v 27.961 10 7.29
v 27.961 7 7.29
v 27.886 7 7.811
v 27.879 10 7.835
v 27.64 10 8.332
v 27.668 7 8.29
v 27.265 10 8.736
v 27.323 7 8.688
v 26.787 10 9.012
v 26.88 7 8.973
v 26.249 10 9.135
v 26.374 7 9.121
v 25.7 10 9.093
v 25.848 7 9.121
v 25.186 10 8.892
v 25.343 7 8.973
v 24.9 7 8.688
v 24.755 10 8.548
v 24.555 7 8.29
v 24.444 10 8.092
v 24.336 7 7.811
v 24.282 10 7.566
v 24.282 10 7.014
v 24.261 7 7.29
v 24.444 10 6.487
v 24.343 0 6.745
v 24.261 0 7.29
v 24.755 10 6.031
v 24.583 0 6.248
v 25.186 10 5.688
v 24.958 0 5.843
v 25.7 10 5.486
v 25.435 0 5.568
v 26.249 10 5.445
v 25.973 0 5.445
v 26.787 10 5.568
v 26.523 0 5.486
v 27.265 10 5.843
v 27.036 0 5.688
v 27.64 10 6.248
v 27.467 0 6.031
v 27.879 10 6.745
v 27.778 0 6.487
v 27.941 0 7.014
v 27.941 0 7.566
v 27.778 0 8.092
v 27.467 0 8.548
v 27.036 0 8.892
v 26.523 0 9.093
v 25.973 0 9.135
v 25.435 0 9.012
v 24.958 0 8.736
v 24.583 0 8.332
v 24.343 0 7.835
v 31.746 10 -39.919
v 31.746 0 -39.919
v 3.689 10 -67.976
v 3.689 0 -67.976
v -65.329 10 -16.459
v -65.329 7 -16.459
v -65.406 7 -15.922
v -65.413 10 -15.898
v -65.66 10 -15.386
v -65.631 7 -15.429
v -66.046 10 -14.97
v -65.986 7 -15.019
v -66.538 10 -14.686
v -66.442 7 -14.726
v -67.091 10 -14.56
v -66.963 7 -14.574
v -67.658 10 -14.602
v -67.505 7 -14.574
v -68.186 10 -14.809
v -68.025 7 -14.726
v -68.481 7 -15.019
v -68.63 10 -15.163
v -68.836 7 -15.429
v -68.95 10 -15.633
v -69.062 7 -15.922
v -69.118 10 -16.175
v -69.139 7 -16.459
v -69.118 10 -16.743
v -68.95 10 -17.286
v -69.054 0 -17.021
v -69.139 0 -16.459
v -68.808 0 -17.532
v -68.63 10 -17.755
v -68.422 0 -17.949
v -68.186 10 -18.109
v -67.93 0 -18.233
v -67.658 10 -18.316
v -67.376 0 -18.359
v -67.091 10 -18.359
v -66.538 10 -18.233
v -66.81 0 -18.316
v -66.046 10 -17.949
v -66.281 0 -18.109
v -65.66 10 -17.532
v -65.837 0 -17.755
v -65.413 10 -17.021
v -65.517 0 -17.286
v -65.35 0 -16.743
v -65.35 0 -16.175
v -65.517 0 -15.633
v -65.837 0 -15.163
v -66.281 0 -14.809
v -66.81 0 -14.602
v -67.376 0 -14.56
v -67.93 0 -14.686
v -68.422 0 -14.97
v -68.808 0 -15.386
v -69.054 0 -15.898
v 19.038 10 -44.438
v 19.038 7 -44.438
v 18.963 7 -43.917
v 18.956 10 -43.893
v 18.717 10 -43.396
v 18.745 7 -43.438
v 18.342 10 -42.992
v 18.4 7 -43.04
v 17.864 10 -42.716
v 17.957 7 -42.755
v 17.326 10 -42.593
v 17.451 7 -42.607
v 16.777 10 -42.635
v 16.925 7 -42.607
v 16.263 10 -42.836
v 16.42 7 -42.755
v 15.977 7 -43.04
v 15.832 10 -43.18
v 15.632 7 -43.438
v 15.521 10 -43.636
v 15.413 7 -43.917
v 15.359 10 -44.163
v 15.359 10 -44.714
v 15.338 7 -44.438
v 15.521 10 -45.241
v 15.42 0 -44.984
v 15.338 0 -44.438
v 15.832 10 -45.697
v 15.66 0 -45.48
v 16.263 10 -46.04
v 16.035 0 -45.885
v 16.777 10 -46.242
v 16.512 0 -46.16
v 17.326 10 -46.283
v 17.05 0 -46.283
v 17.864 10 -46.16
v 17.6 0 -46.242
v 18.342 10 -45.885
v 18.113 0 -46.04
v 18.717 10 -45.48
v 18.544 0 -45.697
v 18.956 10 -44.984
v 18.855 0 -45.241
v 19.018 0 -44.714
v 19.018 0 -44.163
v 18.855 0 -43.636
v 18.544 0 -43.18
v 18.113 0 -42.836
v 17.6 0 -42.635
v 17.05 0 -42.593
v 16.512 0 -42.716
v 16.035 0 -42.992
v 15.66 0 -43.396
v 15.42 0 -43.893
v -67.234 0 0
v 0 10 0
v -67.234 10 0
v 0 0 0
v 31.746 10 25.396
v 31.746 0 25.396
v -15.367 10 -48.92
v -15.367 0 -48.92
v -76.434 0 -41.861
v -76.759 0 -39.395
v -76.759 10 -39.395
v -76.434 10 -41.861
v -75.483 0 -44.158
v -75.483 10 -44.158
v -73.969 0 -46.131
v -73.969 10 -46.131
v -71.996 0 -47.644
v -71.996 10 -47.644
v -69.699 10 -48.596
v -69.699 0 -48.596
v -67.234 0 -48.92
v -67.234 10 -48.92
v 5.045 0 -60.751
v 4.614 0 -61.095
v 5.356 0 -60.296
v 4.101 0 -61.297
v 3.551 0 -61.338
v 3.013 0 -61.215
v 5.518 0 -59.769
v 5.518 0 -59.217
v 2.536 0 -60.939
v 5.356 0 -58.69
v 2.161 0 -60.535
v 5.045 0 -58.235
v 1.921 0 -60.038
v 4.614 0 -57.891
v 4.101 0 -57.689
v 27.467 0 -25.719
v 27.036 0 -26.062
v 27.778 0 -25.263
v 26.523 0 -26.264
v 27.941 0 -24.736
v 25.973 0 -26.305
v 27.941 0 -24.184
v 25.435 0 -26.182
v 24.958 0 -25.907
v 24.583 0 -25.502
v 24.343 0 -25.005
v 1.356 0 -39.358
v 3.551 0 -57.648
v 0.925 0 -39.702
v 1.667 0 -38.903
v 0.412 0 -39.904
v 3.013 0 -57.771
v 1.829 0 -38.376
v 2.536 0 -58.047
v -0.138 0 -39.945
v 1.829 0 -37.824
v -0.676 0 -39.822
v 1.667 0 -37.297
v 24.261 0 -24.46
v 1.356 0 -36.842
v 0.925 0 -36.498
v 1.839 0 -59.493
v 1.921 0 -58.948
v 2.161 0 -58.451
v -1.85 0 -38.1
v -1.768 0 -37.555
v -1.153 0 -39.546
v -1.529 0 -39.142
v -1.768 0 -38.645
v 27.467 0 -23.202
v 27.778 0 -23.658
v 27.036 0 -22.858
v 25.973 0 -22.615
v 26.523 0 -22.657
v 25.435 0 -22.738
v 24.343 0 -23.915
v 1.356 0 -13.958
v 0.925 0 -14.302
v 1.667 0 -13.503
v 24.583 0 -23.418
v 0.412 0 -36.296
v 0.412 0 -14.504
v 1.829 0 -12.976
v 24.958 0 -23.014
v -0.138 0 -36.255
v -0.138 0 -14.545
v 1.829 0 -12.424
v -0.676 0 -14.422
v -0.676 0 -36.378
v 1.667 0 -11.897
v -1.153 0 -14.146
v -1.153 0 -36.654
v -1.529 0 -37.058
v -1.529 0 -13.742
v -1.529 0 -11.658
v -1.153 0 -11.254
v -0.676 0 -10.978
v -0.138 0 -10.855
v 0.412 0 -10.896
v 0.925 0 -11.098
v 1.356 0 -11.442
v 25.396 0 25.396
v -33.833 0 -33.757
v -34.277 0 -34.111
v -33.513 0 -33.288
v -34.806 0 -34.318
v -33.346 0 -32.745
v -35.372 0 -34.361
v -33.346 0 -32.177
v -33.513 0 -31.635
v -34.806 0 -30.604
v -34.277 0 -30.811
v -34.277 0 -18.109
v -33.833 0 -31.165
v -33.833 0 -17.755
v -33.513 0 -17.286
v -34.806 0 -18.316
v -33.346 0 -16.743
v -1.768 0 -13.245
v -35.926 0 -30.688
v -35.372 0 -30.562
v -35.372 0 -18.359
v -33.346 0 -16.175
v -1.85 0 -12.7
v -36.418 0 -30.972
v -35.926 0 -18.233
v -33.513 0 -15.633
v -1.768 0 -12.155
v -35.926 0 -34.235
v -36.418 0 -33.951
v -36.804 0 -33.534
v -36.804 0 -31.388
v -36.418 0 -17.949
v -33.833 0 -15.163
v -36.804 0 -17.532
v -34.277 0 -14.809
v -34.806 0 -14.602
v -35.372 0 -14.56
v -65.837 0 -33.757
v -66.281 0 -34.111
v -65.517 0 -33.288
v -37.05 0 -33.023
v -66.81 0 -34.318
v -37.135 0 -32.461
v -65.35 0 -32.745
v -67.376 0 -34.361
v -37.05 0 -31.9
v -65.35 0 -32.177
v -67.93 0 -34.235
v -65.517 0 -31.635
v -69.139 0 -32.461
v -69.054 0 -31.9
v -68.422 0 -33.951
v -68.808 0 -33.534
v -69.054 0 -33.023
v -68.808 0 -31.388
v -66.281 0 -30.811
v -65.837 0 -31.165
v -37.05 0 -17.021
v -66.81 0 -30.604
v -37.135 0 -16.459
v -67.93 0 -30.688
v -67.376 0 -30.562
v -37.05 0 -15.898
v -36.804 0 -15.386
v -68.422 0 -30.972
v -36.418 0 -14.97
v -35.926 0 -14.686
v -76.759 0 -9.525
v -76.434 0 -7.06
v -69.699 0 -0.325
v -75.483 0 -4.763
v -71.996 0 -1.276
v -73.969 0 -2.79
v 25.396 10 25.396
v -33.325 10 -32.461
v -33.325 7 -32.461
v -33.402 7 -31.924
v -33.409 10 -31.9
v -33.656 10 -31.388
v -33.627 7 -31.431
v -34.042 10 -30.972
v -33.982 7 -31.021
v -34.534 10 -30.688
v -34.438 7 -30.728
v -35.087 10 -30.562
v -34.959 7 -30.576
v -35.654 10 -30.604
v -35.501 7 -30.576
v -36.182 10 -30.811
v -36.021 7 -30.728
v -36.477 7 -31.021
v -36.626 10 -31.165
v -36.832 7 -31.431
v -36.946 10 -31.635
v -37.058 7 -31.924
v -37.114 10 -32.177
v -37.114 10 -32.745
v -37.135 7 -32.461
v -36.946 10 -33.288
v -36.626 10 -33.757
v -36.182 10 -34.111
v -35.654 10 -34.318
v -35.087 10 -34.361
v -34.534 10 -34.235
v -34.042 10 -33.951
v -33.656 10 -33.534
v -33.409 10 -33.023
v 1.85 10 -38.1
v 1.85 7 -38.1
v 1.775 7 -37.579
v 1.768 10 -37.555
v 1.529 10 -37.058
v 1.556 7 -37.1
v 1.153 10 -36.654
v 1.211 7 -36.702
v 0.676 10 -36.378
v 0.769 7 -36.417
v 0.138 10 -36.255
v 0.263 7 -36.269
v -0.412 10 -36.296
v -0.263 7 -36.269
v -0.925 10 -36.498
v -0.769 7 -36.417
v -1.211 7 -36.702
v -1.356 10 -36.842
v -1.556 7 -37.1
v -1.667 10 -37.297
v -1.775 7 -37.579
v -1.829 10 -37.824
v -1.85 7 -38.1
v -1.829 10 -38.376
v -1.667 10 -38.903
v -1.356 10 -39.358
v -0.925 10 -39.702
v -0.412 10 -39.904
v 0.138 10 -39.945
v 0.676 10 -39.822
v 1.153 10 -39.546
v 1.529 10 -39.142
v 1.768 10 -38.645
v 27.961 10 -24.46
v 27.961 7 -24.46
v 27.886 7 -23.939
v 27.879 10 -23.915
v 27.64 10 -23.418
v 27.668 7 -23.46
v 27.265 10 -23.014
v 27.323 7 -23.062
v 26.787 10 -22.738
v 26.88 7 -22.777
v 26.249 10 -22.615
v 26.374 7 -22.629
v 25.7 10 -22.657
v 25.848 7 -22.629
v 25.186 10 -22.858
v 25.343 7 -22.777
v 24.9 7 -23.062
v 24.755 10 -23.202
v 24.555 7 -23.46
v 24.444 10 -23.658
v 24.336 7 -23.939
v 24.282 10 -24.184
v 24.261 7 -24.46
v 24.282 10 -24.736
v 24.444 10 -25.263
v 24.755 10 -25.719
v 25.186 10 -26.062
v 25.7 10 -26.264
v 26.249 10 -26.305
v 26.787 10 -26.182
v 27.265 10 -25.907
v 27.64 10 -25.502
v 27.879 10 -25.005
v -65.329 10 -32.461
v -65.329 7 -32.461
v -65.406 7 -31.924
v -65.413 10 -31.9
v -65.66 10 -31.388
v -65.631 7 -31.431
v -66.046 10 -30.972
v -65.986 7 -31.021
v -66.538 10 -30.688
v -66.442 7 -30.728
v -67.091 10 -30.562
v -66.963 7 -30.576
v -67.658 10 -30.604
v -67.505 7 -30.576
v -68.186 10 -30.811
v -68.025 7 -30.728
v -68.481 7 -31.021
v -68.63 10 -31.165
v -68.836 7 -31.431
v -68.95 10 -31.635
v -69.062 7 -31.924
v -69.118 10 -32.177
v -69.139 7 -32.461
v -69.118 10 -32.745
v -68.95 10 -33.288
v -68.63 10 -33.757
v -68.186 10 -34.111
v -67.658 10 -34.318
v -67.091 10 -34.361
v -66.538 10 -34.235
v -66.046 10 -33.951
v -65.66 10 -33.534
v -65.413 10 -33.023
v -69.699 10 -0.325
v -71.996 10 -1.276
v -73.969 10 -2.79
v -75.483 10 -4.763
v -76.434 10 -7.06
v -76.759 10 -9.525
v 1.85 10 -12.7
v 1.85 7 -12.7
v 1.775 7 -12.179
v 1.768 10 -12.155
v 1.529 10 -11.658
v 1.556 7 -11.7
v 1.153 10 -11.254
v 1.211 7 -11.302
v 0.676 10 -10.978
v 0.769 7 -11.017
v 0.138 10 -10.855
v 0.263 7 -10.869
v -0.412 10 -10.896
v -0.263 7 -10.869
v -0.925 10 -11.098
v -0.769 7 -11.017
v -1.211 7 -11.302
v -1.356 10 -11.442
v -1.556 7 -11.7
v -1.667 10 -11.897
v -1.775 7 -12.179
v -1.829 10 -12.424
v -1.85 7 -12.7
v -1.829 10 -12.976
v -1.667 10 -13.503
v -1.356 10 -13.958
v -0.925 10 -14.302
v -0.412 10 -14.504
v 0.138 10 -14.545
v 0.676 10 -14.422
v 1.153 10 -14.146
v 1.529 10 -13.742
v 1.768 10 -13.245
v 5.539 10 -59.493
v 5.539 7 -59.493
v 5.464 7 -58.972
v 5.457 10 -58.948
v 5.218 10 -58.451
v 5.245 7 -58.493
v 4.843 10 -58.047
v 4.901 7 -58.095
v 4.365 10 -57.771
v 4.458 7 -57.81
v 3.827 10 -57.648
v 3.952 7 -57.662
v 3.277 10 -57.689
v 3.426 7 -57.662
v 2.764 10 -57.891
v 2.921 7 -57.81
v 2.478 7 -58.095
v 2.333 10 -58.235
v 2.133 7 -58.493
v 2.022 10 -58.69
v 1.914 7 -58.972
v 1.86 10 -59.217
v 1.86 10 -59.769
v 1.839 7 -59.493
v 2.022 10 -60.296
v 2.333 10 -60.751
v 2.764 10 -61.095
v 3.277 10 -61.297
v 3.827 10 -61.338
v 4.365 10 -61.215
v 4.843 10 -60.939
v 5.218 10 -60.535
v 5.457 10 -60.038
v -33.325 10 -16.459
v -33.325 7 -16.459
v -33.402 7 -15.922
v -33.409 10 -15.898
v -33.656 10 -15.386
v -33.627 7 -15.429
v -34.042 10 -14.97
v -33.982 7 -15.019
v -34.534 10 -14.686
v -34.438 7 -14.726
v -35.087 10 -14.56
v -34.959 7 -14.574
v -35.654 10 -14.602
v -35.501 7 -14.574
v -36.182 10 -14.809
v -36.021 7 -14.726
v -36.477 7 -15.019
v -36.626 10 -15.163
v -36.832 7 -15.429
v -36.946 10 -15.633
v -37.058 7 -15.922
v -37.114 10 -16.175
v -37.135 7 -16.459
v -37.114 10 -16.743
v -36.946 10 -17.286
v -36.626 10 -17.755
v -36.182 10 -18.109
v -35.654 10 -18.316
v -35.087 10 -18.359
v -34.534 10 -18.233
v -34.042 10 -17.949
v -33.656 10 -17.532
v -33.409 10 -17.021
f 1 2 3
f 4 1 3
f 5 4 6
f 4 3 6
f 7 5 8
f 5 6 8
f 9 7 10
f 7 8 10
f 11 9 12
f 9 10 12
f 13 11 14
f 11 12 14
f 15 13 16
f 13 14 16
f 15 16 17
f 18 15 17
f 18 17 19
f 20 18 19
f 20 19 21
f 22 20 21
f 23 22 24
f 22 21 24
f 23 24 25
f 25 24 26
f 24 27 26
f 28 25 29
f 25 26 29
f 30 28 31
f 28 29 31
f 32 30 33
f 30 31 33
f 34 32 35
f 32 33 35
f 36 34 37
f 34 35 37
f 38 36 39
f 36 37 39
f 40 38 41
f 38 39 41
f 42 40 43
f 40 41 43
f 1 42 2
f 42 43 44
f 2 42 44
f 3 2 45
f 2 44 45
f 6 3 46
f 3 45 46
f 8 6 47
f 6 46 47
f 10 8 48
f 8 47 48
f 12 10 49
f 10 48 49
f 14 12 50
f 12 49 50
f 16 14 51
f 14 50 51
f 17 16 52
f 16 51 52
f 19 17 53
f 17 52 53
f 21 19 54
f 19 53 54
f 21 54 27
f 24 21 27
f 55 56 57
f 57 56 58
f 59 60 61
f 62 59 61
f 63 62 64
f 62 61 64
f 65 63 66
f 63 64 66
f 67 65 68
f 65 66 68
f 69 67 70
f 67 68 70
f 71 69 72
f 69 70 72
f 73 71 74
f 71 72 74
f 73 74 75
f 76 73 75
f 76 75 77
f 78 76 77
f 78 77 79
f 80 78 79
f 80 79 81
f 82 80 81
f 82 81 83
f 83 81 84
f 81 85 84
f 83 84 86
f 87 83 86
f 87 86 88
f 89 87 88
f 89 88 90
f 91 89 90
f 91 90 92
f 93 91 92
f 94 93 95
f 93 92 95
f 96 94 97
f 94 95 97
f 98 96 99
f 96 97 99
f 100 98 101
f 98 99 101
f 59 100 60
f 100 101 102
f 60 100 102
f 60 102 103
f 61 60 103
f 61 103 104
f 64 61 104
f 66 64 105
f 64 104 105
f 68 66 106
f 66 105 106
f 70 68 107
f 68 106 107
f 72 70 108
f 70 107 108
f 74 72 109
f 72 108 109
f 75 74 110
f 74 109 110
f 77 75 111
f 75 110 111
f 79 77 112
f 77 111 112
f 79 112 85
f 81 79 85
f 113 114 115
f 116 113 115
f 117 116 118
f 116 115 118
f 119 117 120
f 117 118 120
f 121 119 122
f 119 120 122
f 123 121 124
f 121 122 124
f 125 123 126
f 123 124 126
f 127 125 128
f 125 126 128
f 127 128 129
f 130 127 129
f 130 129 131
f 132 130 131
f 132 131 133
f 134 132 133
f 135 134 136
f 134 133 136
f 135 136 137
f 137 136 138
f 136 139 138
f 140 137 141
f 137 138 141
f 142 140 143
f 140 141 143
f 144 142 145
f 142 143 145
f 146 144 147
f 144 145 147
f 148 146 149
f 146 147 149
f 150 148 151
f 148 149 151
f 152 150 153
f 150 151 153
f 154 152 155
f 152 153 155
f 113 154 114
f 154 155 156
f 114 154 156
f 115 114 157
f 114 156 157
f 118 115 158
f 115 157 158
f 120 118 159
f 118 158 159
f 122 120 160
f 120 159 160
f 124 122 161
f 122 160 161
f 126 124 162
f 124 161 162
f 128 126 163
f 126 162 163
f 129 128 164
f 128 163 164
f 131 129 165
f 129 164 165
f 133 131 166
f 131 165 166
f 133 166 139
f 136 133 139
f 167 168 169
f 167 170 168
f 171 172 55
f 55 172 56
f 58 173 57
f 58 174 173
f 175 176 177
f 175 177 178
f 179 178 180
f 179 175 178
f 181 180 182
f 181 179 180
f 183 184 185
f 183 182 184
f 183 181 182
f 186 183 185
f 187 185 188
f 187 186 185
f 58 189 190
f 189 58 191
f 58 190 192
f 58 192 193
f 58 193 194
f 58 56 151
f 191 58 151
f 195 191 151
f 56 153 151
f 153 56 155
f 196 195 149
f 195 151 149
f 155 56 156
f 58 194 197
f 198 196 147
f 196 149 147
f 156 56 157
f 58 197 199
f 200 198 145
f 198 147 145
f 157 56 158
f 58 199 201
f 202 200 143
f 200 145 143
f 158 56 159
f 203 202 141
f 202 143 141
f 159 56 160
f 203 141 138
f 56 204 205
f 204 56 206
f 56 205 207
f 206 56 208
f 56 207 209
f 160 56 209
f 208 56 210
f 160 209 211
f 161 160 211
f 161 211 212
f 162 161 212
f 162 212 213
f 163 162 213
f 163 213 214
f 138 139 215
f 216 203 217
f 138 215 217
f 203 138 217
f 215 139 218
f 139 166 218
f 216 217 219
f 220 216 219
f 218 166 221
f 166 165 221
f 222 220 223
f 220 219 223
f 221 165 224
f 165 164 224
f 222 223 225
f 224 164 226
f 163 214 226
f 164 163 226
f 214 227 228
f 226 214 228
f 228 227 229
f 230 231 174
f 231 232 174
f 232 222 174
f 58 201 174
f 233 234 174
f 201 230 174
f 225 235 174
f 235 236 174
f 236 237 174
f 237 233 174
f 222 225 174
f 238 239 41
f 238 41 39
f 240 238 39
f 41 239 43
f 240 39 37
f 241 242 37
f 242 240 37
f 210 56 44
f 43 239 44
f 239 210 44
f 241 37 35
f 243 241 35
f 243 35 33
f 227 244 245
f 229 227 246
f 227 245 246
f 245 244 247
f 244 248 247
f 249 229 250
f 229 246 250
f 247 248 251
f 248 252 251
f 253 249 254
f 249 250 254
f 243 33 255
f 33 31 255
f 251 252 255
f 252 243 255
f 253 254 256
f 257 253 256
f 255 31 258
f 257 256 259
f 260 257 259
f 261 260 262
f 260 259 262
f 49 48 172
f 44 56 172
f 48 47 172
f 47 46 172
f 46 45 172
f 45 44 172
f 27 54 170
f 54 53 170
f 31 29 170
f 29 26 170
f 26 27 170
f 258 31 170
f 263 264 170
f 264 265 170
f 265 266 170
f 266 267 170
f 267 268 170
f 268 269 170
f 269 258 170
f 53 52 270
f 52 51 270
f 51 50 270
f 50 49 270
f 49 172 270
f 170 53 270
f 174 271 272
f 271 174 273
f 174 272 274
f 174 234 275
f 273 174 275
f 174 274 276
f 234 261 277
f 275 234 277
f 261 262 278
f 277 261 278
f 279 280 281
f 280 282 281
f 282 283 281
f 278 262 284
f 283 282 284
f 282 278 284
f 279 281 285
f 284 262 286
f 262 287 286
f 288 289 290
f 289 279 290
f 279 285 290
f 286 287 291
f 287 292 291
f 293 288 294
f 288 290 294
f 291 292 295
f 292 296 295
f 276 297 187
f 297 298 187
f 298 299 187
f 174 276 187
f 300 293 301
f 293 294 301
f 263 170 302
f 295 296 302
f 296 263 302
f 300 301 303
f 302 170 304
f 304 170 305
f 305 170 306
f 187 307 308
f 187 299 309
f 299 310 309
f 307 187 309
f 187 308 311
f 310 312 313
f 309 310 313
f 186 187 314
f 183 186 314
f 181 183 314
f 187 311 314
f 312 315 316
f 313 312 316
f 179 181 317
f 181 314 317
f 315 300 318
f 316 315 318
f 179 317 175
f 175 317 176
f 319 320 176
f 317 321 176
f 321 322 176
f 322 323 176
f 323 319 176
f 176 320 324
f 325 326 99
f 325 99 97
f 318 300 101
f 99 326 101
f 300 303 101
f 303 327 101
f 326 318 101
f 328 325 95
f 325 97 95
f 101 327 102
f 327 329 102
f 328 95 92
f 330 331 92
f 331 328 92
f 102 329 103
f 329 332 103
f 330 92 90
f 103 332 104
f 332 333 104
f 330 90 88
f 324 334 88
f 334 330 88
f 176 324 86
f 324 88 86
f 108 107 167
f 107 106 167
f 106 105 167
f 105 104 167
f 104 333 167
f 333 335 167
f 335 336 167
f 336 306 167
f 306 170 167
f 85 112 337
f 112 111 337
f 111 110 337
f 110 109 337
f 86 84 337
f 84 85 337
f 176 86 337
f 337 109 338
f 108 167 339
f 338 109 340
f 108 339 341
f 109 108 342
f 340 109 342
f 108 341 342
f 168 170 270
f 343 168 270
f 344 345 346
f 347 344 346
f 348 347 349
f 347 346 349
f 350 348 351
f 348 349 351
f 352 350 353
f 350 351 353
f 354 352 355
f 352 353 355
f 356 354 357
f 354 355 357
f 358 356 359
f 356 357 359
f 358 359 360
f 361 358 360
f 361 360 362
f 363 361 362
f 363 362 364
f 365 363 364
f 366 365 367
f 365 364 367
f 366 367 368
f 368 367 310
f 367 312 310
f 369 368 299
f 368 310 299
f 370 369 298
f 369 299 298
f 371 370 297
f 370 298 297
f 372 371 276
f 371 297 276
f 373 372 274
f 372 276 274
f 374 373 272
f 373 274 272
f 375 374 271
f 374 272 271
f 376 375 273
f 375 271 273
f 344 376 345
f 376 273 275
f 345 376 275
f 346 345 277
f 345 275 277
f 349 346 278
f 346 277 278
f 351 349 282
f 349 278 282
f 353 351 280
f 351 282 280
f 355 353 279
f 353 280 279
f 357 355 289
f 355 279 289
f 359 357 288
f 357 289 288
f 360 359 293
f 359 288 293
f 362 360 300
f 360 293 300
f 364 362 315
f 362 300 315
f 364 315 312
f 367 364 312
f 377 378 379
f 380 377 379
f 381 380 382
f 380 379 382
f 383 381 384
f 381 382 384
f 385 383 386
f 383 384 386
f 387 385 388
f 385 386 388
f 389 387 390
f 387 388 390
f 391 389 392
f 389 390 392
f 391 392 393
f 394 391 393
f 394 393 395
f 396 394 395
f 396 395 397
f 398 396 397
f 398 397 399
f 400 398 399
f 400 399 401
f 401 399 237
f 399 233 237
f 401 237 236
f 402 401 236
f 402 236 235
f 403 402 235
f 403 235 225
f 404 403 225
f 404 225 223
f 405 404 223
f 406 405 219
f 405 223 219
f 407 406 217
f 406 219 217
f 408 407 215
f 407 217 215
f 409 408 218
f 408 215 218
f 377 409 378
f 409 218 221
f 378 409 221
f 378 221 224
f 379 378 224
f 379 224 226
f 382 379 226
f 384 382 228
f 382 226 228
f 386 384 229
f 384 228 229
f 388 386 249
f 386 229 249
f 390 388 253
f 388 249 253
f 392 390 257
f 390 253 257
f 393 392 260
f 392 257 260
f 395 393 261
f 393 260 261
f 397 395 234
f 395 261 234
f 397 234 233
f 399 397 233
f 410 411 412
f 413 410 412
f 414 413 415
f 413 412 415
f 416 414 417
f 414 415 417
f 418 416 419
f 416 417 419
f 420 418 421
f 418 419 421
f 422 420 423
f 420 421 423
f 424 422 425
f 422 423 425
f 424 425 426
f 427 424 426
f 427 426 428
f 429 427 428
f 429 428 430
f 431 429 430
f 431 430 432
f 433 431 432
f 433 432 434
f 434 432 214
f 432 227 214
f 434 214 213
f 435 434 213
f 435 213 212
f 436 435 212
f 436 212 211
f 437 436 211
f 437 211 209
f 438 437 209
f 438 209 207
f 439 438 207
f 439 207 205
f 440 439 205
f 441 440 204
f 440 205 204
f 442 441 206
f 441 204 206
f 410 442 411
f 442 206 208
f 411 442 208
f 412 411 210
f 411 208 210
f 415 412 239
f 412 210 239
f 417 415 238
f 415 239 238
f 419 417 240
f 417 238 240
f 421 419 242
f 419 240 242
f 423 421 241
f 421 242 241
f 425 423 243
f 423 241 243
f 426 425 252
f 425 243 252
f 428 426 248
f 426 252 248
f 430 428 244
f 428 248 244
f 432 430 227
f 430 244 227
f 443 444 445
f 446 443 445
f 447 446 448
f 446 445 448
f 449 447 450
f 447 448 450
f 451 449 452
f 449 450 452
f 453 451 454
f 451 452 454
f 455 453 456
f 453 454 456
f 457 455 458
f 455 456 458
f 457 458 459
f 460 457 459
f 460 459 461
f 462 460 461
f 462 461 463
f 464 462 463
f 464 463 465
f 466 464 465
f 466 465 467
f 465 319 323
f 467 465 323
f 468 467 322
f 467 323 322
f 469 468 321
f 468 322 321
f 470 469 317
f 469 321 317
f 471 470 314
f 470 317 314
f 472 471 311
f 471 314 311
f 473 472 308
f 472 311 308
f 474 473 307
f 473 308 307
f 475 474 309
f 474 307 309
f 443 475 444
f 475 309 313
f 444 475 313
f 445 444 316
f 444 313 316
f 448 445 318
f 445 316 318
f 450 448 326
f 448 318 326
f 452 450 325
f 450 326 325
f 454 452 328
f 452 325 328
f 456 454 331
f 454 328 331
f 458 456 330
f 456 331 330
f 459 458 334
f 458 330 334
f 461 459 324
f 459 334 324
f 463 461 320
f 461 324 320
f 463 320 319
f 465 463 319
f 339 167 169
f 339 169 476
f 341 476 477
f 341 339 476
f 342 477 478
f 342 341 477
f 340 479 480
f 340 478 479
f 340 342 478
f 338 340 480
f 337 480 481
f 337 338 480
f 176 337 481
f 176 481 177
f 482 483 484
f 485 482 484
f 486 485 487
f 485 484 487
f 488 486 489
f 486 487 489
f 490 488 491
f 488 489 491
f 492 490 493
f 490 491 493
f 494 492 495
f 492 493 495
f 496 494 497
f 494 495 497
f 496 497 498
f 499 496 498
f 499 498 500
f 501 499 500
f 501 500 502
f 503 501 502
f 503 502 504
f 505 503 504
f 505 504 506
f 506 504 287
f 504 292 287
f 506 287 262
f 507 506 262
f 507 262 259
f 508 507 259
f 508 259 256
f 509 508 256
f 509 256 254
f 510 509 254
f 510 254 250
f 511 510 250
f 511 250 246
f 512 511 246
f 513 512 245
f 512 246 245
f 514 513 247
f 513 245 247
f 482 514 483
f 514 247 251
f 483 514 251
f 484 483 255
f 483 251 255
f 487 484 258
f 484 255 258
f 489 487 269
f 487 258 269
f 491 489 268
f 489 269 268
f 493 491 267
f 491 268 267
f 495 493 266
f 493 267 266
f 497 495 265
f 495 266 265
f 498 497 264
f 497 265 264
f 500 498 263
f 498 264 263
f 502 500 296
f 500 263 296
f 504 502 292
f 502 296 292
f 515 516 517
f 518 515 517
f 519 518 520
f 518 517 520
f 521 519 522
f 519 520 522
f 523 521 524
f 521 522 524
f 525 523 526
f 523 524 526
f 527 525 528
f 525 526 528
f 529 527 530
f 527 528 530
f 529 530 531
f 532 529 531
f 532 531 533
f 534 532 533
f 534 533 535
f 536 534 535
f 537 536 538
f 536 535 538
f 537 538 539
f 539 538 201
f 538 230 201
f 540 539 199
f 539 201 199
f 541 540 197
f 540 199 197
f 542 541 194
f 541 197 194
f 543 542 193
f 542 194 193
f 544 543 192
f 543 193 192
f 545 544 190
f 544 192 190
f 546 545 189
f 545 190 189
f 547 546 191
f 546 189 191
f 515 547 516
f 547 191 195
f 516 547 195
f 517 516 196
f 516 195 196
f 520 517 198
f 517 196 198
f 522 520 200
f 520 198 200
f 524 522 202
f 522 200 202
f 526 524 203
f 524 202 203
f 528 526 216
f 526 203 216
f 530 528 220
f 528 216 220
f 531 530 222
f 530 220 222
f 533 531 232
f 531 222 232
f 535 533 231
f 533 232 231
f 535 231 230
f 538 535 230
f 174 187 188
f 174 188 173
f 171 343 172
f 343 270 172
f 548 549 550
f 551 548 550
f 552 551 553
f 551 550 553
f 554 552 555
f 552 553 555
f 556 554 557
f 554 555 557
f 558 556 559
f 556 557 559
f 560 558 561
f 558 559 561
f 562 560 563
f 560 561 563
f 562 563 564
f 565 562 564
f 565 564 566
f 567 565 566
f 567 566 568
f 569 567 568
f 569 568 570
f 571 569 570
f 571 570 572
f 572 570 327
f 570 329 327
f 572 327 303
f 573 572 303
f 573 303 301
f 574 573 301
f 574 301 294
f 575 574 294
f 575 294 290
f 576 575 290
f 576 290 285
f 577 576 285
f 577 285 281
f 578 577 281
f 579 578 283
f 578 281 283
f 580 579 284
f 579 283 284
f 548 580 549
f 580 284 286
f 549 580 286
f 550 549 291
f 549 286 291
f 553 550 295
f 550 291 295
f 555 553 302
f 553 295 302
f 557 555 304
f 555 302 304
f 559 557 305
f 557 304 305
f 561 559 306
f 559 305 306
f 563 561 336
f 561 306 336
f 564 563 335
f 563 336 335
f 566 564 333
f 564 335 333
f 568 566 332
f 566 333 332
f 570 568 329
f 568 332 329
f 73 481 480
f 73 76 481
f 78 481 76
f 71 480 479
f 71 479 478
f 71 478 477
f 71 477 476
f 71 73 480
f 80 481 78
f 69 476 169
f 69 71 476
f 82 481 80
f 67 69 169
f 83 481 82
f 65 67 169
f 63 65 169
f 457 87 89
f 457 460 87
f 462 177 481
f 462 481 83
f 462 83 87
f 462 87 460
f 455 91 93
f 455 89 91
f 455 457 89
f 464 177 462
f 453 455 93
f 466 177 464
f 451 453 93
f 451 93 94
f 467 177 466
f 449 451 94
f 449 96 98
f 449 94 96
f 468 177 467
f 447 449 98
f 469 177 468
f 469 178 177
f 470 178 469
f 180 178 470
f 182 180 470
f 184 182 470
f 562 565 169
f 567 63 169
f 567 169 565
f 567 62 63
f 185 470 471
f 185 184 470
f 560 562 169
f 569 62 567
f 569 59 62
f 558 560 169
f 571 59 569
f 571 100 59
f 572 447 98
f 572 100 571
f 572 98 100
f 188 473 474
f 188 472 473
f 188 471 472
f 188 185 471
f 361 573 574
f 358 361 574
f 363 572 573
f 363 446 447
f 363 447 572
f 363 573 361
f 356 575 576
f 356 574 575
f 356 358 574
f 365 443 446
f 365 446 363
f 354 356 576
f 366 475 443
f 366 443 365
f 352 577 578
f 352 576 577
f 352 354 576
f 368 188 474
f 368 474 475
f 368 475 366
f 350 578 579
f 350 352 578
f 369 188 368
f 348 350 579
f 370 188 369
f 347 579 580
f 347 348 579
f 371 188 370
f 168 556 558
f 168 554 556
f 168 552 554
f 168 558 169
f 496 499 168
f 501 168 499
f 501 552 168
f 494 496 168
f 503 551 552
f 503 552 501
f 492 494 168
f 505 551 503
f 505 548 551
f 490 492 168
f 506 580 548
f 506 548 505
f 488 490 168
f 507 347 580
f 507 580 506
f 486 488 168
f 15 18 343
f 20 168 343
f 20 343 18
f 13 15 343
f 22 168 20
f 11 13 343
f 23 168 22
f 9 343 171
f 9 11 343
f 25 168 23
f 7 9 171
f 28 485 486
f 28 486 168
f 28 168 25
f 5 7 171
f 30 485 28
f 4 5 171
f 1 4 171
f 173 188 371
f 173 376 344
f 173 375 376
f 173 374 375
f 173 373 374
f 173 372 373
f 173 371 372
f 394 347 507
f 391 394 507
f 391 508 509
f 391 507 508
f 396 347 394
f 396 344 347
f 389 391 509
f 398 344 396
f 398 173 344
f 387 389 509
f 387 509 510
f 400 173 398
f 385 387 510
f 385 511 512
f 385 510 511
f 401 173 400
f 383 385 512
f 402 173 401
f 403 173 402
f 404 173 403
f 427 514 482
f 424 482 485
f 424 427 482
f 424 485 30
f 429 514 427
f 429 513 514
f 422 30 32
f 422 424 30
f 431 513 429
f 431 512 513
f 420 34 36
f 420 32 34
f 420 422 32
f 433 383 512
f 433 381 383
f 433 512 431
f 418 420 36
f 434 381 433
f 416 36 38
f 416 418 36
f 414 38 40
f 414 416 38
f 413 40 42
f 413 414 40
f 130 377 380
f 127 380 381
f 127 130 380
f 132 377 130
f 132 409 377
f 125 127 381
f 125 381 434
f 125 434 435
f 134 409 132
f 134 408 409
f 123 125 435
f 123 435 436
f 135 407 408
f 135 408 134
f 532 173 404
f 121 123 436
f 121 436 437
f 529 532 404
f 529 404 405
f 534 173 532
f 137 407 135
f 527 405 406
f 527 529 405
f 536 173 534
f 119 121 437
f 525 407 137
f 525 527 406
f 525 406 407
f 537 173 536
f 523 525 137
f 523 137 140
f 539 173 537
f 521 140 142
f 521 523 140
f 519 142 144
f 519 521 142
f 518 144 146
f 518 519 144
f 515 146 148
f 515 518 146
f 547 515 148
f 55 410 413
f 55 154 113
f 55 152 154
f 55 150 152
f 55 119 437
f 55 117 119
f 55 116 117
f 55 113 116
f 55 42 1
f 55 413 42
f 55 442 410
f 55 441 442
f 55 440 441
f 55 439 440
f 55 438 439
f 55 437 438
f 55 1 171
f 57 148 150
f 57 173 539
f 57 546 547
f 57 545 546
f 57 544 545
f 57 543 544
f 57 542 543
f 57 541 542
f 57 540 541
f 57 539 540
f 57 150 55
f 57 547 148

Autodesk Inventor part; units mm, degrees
ref_plane "YZ Plane" through (0, 0, 0) normal (1, 0, 0) x (0, 1, 0)
ref_plane "XZ Plane" through (0, 0, 0) normal (0, 1, 0) x (-1, 0, 0)
ref_plane "XY Plane" through (0, 0, 0) normal (0, 0, 1) x (1, 0, 0)
sketch "Sketch1" plane through (0, 0, 0) normal (0, 1, 0) x (-1, 0, 0)
  line L0 (0, 0) -> (67.2338, 0)
  arc A0 (76.7588, -9.525) -> (67.2338, 0) centre (67.2338, -9.525) ccw
  arc A1 (67.2338, -48.9204) -> (76.7588, -39.3954) centre (67.2338, -39.3954) ccw
  line L1 (76.7588, -9.525) -> (76.7588, -39.3954)
  line L2 (67.2338, -48.9204) -> (15.367, -48.9204)
  line L3 (15.367, -48.9204) -> (-3.6891, -67.9765)
  line L4 (0, 0) -> (-25.3962, 25.3962)
  circle A2 centre (35.2298, -16.4592) radius 1.905
  circle A3 centre (35.2298, -32.4612) radius 1.905
  circle A4 centre (67.2338, -32.4612) radius 1.905
  circle A5 centre (67.2338, -16.4592) radius 1.905
  circle A6 centre (-26.1112, -24.4602) radius 1.85
  circle A7 centre (-26.1112, 7.2898) radius 1.85
  line L5 (-25.3962, 25.3962) -> (-31.7462, 25.3962)
  line L6 (-31.7462, 25.3962) -> (-31.7462, -39.9194)
  line L7 (-31.7462, -39.9194) -> (-3.6891, -67.9765)
  circle A8 centre (0, -12.7) radius 1.85
  circle A9 centre (0, -38.1) radius 1.85
  line L8 (-3.6891, -67.9765) -> (-12.6694, -58.9962)
  circle A10 centre (-3.6891, -59.4929) radius 1.85
  circle A11 centre (-17.1882, -44.4383) radius 1.85
  dimension "d21" = 6.35
extrude "Extrusion1" add sketch "Sketch1" along normal blind 7
sketch "Sketch2" plane through (0, 7, 0) normal (0, 1, 0) x (1, 0, 0)
  line L0 (0, 0) -> (25.3962, -25.3962) projected
  line L1 (0, 0) -> (25.3962, -25.3962)
  line L2 (25.3962, -25.3962) -> (31.7462, -25.3962) projected
  line L3 (25.3962, -25.3962) -> (31.7462, -25.3962)
  line L4 (31.7462, -25.3962) -> (31.7462, 39.9194) projected
  line L5 (31.7462, -25.3962) -> (31.7462, 39.9194)
  line L6 (3.6891, 67.9765) -> (-15.367, 48.9204) projected
  line L7 (31.7462, 39.9194) -> (3.6891, 67.9765)
  line L8 (3.6891, 67.9765) -> (-15.367, 48.9204)
  arc A0 (-67.2338, 48.9204) -> (-76.7588, 39.3954) centre (-67.2338, 39.3954) ccw projected
  line L9 (-15.367, 48.9204) -> (-67.2338, 48.9204)
  line L10 (-67.2338, 0) -> (0, 0) projected
  line L11 (0, 0) -> (-67.2338, 0)
  arc A1 (-67.2338, 48.9204) -> (-76.7588, 39.3954) centre (-67.2338, 39.3954) ccw
  arc A2 (-76.7588, 9.525) -> (-67.2338, 0) centre (-67.2338, 9.525) ccw projected
  arc A3 (-76.7588, 9.525) -> (-67.2338, 0) centre (-67.2338, 9.525) ccw
  line L12 (-76.7588, 39.3954) -> (-76.7588, 9.525) projected
  line L13 (-76.7588, 39.3954) -> (-76.7588, 9.525)
  circle A4 centre (3.6891, 59.4929) radius 1.85 projected
  circle A5 centre (3.6891, 59.4929) radius 1.85
  circle A6 centre (0, 38.1) radius 1.85 projected
  circle A7 centre (0, 38.1) radius 1.85
  circle A8 centre (17.1882, 44.4383) radius 1.85 projected
  circle A9 centre (17.1882, 44.4383) radius 1.85
  circle A10 centre (26.1112, 24.4602) radius 1.85 projected
  circle A11 centre (26.1112, 24.4602) radius 1.85
  circle A12 centre (26.1112, -7.2898) radius 1.85 projected
  circle A13 centre (26.1112, -7.2898) radius 1.85
  circle A14 centre (0, 12.7) radius 1.85 projected
  circle A15 centre (0, 12.7) radius 1.85
  circle A16 centre (-35.2298, 16.4592) radius 1.905 projected
  circle A17 centre (-35.2298, 16.4592) radius 1.905
  circle A18 centre (-35.2298, 32.4612) radius 1.905 projected
  circle A19 centre (-35.2298, 32.4612) radius 1.905
  circle A20 centre (-67.2338, 32.4612) radius 1.905 projected
  circle A21 centre (-67.2338, 32.4612) radius 1.905
  circle A22 centre (-67.2338, 16.4592) radius 1.905 projected
  circle A23 centre (-67.2338, 16.4592) radius 1.905
extrude "Extrusion2" add sketch "Sketch2" along normal blind 3
properties part number "MotorSuspension"
